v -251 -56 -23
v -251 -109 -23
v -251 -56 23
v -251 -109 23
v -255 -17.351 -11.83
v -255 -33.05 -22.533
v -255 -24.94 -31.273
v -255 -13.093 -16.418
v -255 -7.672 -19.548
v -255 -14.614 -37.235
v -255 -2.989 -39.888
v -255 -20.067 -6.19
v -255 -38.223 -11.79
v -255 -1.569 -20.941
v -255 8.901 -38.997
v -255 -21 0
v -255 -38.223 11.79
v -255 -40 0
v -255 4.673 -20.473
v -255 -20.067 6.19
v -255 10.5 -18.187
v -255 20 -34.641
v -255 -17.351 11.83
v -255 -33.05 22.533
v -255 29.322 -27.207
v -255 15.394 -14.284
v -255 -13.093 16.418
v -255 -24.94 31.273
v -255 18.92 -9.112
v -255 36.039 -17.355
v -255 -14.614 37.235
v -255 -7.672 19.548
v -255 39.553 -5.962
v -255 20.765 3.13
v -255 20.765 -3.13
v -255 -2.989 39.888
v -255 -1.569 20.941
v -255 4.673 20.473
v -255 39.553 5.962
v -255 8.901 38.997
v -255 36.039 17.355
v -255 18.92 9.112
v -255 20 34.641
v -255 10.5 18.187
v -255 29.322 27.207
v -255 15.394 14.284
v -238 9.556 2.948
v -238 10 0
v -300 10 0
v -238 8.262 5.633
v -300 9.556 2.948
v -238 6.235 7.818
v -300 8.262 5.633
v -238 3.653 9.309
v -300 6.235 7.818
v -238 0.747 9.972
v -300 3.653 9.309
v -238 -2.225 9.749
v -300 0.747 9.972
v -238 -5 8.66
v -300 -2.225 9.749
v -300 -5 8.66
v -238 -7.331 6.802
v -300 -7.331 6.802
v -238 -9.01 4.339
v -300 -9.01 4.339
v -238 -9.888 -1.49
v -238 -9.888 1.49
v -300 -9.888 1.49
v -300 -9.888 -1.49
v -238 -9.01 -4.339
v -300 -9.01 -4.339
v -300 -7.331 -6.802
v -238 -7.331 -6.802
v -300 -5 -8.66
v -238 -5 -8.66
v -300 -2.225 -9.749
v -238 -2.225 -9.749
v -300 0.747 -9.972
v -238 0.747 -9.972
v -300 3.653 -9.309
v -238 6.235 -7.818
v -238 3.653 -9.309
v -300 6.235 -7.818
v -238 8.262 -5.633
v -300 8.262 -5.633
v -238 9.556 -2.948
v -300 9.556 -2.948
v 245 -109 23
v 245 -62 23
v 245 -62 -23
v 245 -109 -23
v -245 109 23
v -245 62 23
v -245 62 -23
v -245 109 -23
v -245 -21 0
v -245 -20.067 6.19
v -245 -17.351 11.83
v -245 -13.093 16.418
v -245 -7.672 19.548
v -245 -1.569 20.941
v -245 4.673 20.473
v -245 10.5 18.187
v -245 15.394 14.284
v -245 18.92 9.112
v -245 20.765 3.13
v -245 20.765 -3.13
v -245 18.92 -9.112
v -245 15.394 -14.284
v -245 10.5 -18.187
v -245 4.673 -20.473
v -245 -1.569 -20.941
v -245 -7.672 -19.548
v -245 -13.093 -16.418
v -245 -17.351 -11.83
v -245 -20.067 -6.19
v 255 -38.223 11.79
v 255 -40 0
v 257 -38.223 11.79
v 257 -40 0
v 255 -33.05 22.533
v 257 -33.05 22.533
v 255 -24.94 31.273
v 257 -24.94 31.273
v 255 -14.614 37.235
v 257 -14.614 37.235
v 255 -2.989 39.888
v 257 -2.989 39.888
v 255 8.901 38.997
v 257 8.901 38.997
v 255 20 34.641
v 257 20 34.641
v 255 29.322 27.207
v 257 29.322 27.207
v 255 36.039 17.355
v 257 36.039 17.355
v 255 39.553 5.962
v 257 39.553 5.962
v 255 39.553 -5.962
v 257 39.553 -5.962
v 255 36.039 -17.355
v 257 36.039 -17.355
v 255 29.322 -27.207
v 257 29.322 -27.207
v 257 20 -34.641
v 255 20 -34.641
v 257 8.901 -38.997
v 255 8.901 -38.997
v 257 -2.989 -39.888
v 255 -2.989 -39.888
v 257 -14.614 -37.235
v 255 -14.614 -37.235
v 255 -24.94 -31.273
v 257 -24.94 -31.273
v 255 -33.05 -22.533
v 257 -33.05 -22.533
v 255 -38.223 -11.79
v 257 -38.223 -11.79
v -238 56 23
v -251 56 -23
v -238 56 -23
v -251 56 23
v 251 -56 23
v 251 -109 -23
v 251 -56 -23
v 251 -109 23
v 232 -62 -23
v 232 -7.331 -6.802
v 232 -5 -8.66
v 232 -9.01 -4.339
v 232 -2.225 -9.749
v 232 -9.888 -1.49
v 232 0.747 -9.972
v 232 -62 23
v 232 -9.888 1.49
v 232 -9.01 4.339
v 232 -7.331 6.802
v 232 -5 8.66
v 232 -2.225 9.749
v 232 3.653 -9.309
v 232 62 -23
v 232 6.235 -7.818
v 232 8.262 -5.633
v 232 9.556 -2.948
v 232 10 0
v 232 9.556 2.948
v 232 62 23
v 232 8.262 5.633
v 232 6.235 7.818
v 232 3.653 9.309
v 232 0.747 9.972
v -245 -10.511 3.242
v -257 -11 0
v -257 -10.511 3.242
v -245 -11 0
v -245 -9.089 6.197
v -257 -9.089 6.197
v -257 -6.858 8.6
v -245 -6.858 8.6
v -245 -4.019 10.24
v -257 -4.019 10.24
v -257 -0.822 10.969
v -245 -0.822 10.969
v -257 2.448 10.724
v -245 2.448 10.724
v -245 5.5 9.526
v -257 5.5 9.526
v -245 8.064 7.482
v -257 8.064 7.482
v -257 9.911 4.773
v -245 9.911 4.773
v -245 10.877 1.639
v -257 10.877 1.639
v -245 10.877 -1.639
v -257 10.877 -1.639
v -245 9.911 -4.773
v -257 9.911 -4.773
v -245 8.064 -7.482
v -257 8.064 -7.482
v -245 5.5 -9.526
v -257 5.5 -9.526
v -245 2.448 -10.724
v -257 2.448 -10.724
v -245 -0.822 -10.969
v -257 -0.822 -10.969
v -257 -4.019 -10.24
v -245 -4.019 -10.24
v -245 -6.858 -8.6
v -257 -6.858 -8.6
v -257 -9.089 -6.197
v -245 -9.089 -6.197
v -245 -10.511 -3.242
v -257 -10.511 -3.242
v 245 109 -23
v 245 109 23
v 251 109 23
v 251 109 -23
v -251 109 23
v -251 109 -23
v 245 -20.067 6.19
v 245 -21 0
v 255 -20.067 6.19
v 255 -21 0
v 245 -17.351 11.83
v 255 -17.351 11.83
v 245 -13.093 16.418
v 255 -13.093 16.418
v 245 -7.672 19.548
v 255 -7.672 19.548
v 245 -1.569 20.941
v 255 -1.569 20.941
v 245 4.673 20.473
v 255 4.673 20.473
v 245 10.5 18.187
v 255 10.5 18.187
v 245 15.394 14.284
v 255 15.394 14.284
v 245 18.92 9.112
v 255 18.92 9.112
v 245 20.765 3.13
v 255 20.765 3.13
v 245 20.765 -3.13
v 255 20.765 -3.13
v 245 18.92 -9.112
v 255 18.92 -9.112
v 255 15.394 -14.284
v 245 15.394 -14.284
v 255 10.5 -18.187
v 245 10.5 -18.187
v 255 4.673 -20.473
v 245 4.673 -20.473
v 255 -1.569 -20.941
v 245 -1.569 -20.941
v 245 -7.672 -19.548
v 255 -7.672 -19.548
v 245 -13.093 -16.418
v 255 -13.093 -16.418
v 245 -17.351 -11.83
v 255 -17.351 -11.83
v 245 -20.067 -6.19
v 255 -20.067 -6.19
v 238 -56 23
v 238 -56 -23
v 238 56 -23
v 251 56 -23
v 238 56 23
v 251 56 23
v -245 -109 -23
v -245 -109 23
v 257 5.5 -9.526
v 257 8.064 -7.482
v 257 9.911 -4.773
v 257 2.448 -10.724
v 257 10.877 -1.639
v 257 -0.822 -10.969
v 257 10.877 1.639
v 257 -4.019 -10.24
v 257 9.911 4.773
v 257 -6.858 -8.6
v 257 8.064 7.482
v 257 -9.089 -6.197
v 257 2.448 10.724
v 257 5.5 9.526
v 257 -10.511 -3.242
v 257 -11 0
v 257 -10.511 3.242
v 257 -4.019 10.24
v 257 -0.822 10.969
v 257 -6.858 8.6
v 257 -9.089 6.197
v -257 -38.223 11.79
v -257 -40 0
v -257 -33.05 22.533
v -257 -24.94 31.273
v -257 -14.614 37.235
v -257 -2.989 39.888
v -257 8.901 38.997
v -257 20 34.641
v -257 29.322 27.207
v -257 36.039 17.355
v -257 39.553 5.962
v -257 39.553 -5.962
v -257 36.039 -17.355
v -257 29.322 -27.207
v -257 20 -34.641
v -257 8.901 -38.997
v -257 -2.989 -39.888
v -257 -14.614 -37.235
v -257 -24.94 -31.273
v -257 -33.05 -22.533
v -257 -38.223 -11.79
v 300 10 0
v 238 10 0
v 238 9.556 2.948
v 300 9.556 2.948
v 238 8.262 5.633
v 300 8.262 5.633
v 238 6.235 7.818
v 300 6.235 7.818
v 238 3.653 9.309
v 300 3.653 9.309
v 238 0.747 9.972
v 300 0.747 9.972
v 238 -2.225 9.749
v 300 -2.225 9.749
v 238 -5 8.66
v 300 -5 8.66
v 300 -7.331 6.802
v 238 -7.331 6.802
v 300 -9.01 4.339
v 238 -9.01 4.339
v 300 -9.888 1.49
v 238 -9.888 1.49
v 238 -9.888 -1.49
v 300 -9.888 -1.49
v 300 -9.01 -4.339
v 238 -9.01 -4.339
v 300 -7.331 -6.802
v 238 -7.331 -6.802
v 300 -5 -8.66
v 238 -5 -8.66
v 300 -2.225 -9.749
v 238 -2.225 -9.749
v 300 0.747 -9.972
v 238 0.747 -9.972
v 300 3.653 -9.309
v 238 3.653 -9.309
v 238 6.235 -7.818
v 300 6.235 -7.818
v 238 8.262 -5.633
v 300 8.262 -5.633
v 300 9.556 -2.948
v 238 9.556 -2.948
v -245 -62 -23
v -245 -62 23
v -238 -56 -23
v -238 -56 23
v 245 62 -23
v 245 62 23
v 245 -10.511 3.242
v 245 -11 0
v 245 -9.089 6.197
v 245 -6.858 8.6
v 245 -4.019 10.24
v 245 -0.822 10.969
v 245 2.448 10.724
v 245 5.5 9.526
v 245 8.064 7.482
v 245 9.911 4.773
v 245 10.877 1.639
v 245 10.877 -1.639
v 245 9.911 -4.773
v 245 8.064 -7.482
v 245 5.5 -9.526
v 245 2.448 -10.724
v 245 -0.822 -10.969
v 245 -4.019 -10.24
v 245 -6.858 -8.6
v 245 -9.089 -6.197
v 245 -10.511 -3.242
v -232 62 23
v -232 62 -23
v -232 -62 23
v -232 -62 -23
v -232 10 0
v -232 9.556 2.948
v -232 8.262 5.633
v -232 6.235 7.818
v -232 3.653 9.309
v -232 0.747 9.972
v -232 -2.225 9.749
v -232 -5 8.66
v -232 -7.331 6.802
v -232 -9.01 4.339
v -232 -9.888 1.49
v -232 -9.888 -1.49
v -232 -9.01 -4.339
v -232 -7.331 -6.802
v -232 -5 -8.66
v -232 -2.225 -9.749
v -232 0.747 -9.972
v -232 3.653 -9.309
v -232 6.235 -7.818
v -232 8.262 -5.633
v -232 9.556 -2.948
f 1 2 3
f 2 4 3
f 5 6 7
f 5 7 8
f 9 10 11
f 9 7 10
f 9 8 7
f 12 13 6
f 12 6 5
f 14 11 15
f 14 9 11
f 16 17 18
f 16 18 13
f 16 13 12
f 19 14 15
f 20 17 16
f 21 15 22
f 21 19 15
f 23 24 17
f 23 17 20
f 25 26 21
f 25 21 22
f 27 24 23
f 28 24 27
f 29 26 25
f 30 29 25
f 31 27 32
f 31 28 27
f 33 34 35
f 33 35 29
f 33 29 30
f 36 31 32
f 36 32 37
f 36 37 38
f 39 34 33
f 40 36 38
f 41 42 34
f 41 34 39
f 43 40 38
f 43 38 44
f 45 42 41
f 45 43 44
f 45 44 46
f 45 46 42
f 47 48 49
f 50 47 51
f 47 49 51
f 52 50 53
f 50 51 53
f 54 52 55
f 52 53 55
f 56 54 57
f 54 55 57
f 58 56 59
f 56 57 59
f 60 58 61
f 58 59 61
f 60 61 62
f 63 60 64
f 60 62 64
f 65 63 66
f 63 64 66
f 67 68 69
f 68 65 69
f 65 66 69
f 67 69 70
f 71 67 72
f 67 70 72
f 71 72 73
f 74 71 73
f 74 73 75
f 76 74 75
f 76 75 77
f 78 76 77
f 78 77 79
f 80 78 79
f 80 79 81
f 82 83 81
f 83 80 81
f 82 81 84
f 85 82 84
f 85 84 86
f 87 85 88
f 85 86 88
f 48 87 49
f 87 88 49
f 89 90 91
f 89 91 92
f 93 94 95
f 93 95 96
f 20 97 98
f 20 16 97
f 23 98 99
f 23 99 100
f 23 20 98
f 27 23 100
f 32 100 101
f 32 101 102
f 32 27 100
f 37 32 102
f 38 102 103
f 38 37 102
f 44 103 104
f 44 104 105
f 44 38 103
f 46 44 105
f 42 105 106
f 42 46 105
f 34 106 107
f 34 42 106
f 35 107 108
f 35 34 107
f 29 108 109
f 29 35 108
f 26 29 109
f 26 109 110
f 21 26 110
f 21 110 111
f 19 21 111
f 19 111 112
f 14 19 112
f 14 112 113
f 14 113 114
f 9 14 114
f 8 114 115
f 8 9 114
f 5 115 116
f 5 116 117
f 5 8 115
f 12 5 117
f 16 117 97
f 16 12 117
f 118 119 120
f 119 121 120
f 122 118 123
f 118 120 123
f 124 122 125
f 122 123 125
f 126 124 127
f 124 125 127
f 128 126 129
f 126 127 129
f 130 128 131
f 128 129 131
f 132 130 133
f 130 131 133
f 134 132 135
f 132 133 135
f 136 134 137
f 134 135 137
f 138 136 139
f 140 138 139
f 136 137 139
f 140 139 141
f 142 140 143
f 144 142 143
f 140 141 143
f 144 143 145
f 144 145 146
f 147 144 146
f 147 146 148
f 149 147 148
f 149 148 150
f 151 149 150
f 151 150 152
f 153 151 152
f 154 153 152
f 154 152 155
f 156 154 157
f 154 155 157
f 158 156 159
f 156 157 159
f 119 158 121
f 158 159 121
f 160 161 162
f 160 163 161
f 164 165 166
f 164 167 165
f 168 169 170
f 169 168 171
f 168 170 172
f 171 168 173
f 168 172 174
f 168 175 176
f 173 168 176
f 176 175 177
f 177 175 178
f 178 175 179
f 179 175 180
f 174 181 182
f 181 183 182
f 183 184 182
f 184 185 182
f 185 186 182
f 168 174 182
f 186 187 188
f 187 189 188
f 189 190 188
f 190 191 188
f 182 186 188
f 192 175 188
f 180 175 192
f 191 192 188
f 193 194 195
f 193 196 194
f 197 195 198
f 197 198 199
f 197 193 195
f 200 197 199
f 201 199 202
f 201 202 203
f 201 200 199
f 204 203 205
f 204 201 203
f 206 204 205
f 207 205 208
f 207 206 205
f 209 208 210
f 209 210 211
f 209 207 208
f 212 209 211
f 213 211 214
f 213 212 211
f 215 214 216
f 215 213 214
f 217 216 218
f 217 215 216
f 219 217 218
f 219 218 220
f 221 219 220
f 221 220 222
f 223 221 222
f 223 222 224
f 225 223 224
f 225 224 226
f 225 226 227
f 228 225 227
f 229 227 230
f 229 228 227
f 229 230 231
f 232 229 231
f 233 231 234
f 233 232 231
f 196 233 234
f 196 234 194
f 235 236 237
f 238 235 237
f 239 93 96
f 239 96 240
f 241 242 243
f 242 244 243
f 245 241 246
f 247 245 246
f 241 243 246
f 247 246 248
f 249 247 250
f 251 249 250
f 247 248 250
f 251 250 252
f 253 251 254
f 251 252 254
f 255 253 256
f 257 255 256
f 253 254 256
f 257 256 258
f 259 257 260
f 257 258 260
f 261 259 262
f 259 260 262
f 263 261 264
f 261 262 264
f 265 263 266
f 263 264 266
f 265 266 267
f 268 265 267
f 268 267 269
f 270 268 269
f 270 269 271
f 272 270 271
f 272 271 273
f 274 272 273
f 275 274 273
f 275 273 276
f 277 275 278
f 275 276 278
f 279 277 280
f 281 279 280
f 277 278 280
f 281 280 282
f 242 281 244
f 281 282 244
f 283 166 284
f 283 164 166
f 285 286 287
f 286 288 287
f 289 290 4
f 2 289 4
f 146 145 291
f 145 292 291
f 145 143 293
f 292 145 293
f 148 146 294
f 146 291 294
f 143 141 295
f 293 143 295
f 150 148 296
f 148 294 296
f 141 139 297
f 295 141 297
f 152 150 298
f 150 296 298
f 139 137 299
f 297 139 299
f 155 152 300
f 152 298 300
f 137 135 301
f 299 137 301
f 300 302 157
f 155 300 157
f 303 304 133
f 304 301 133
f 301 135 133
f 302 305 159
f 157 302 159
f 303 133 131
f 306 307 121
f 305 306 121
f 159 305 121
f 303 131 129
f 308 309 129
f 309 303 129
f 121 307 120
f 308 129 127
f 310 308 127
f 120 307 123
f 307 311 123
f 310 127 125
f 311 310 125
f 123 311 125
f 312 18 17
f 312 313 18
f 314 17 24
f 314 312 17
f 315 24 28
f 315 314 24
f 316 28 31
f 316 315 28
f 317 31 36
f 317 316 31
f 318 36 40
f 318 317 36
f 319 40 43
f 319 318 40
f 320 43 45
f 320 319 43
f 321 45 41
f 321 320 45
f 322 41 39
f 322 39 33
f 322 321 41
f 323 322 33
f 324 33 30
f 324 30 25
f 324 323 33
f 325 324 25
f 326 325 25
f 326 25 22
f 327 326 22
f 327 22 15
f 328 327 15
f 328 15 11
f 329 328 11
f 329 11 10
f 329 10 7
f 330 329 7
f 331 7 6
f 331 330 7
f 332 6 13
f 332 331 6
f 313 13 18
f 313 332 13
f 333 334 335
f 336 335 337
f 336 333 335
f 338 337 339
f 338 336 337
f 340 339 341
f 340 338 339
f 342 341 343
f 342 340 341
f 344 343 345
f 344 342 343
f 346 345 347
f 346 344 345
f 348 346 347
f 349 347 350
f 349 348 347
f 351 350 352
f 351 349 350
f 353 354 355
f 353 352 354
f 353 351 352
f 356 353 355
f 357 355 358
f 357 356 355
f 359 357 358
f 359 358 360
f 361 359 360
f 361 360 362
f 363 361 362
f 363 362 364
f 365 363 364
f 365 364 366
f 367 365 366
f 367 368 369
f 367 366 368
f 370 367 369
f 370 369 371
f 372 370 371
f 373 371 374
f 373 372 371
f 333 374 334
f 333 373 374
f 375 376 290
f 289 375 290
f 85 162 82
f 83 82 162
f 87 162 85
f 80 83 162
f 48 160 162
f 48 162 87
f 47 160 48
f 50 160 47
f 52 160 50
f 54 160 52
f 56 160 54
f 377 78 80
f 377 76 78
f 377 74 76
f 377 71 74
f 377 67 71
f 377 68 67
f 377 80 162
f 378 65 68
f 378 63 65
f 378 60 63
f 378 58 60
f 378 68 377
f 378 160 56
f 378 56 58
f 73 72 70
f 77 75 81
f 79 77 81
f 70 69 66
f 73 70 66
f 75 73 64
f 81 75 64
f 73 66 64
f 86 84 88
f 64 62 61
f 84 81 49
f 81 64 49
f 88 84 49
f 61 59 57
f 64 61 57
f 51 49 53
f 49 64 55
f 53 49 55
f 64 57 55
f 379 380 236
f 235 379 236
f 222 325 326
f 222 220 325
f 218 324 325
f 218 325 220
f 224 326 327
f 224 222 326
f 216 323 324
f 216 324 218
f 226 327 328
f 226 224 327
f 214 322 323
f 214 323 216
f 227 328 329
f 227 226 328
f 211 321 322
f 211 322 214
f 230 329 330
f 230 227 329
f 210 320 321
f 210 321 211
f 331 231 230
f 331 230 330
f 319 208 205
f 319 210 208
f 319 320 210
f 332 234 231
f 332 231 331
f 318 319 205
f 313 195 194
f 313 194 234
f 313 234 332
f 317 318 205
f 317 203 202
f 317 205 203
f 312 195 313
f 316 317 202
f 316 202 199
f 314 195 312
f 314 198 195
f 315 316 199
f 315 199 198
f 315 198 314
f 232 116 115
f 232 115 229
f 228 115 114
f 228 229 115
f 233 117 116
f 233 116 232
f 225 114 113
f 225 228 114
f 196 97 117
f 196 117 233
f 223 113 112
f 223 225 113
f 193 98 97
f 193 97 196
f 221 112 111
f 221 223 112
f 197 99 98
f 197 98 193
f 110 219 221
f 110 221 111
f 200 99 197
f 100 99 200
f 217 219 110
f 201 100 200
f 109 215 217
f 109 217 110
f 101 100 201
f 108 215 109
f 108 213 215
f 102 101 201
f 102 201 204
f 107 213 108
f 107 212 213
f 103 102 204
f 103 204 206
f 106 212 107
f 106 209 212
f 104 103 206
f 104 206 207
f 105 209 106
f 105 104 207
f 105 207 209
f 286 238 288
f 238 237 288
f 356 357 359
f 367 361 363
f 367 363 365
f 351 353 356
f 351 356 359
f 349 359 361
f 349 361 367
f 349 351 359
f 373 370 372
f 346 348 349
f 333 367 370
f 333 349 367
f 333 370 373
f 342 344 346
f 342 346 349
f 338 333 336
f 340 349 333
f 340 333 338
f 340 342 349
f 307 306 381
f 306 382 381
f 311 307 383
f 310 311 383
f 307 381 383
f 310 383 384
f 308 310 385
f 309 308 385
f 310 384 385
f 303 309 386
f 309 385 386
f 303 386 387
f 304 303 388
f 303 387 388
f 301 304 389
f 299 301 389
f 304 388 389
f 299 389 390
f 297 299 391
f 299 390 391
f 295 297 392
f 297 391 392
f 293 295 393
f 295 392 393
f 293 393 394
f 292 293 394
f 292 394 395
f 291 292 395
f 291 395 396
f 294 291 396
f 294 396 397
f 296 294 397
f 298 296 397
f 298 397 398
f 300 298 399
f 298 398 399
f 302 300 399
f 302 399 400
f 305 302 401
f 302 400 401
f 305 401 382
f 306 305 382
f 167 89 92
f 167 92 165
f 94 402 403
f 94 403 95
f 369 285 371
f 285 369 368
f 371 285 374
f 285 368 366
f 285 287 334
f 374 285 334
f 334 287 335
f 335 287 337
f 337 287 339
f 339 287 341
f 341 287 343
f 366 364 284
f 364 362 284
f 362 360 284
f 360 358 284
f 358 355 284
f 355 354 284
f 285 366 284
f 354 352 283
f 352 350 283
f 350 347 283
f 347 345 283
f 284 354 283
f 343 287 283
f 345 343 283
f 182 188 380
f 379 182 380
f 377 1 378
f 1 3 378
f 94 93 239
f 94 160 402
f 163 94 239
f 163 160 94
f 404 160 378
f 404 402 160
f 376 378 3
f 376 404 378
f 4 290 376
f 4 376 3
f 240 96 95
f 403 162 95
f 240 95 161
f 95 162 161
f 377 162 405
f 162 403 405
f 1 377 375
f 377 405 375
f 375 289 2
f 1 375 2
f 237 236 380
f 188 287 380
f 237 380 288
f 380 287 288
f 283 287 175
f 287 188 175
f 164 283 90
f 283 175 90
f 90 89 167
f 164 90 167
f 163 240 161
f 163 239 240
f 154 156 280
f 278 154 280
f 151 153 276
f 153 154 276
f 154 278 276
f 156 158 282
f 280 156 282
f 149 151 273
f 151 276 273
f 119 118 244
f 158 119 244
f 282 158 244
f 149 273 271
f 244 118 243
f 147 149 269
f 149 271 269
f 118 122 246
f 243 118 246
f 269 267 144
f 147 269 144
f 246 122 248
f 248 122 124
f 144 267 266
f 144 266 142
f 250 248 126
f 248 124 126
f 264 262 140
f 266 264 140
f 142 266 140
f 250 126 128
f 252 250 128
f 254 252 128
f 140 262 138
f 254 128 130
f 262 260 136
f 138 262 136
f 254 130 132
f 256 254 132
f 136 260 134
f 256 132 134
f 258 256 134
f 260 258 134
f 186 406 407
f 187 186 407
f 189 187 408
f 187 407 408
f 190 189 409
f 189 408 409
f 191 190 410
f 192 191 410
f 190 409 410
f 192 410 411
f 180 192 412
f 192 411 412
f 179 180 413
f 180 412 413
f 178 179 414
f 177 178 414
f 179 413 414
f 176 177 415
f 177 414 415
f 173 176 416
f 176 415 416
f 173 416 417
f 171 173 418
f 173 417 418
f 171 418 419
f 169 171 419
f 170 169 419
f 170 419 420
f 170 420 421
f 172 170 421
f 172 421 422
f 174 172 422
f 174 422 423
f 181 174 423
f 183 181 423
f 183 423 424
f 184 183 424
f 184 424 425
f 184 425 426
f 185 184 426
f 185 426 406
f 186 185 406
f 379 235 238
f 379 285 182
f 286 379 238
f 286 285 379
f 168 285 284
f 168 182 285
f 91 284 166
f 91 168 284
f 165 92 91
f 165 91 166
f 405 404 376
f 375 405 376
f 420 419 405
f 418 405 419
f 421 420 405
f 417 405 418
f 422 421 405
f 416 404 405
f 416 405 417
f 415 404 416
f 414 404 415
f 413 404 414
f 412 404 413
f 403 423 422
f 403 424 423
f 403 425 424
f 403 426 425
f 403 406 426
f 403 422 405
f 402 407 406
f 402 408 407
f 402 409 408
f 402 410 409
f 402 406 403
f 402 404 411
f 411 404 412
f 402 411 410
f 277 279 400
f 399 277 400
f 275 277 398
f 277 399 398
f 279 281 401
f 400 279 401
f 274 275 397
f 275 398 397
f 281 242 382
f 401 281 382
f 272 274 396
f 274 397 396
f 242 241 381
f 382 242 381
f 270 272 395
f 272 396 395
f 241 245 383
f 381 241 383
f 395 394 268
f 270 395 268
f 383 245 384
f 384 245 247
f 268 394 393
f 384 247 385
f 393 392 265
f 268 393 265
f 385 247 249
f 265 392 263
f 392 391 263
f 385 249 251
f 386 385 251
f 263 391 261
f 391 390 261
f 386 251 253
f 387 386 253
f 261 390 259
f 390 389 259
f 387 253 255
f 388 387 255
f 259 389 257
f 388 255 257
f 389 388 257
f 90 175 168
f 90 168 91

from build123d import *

# Parameters (mm, degrees)
F2_R          = 10
F3_DEPTH      = 300
F6_DEPTH      = 23
F6_DEPTH_BACK = 23


with BuildPart() as f3:
    # F2 (on offset) → F3 (new body)
    with BuildSketch(Plane.YZ.offset(300)):
        Circle(F2_R)
    extrude(amount=-F3_DEPTH)



with BuildPart() as f5:
    # F4 (on Top) → F5 (revolve)
    with BuildSketch(Plane.XY):
        Polygon((257, -40), (257, -11), (245, -11), (245, -21), (255, -21), (255, -40), align=None)
    revolve(axis=Axis((231.2679007649, 0, 0), (-1, 0, 0)))


with BuildPart() as f6:
    # F4 (on Top) → F6 (new body, two sides)
    with BuildSketch(Plane.XY) as f6_sk:
        Polygon((238, -56), (238, -10), (238, 0), (232, 0), (232, -10), (232, -62), (238, -62), (245, -62), (245, -109), (251, -109), (251, -56), align=None)
    extrude(amount=F6_DEPTH)
    extrude(f6_sk.sketch, amount=-F6_DEPTH_BACK)


with BuildPart() as f3_1:
    add(f3.part)

    add(f6.part)  # F7 merges F6
    # F7: F6 across face
    add(f6.part.mirror(Plane(origin=(235, 0, 0), x_dir=(-1, 0, 0), z_dir=(0, 1, 0))))

    # F8: F3, F5 across plane


with BuildPart() as f3_2:
    add(f3_1.part)
    add(f3_1.part.mirror(Plane.YZ))
    add(f5.part.mirror(Plane.YZ))


solid = Compound([f5.part, f3_2.part])
